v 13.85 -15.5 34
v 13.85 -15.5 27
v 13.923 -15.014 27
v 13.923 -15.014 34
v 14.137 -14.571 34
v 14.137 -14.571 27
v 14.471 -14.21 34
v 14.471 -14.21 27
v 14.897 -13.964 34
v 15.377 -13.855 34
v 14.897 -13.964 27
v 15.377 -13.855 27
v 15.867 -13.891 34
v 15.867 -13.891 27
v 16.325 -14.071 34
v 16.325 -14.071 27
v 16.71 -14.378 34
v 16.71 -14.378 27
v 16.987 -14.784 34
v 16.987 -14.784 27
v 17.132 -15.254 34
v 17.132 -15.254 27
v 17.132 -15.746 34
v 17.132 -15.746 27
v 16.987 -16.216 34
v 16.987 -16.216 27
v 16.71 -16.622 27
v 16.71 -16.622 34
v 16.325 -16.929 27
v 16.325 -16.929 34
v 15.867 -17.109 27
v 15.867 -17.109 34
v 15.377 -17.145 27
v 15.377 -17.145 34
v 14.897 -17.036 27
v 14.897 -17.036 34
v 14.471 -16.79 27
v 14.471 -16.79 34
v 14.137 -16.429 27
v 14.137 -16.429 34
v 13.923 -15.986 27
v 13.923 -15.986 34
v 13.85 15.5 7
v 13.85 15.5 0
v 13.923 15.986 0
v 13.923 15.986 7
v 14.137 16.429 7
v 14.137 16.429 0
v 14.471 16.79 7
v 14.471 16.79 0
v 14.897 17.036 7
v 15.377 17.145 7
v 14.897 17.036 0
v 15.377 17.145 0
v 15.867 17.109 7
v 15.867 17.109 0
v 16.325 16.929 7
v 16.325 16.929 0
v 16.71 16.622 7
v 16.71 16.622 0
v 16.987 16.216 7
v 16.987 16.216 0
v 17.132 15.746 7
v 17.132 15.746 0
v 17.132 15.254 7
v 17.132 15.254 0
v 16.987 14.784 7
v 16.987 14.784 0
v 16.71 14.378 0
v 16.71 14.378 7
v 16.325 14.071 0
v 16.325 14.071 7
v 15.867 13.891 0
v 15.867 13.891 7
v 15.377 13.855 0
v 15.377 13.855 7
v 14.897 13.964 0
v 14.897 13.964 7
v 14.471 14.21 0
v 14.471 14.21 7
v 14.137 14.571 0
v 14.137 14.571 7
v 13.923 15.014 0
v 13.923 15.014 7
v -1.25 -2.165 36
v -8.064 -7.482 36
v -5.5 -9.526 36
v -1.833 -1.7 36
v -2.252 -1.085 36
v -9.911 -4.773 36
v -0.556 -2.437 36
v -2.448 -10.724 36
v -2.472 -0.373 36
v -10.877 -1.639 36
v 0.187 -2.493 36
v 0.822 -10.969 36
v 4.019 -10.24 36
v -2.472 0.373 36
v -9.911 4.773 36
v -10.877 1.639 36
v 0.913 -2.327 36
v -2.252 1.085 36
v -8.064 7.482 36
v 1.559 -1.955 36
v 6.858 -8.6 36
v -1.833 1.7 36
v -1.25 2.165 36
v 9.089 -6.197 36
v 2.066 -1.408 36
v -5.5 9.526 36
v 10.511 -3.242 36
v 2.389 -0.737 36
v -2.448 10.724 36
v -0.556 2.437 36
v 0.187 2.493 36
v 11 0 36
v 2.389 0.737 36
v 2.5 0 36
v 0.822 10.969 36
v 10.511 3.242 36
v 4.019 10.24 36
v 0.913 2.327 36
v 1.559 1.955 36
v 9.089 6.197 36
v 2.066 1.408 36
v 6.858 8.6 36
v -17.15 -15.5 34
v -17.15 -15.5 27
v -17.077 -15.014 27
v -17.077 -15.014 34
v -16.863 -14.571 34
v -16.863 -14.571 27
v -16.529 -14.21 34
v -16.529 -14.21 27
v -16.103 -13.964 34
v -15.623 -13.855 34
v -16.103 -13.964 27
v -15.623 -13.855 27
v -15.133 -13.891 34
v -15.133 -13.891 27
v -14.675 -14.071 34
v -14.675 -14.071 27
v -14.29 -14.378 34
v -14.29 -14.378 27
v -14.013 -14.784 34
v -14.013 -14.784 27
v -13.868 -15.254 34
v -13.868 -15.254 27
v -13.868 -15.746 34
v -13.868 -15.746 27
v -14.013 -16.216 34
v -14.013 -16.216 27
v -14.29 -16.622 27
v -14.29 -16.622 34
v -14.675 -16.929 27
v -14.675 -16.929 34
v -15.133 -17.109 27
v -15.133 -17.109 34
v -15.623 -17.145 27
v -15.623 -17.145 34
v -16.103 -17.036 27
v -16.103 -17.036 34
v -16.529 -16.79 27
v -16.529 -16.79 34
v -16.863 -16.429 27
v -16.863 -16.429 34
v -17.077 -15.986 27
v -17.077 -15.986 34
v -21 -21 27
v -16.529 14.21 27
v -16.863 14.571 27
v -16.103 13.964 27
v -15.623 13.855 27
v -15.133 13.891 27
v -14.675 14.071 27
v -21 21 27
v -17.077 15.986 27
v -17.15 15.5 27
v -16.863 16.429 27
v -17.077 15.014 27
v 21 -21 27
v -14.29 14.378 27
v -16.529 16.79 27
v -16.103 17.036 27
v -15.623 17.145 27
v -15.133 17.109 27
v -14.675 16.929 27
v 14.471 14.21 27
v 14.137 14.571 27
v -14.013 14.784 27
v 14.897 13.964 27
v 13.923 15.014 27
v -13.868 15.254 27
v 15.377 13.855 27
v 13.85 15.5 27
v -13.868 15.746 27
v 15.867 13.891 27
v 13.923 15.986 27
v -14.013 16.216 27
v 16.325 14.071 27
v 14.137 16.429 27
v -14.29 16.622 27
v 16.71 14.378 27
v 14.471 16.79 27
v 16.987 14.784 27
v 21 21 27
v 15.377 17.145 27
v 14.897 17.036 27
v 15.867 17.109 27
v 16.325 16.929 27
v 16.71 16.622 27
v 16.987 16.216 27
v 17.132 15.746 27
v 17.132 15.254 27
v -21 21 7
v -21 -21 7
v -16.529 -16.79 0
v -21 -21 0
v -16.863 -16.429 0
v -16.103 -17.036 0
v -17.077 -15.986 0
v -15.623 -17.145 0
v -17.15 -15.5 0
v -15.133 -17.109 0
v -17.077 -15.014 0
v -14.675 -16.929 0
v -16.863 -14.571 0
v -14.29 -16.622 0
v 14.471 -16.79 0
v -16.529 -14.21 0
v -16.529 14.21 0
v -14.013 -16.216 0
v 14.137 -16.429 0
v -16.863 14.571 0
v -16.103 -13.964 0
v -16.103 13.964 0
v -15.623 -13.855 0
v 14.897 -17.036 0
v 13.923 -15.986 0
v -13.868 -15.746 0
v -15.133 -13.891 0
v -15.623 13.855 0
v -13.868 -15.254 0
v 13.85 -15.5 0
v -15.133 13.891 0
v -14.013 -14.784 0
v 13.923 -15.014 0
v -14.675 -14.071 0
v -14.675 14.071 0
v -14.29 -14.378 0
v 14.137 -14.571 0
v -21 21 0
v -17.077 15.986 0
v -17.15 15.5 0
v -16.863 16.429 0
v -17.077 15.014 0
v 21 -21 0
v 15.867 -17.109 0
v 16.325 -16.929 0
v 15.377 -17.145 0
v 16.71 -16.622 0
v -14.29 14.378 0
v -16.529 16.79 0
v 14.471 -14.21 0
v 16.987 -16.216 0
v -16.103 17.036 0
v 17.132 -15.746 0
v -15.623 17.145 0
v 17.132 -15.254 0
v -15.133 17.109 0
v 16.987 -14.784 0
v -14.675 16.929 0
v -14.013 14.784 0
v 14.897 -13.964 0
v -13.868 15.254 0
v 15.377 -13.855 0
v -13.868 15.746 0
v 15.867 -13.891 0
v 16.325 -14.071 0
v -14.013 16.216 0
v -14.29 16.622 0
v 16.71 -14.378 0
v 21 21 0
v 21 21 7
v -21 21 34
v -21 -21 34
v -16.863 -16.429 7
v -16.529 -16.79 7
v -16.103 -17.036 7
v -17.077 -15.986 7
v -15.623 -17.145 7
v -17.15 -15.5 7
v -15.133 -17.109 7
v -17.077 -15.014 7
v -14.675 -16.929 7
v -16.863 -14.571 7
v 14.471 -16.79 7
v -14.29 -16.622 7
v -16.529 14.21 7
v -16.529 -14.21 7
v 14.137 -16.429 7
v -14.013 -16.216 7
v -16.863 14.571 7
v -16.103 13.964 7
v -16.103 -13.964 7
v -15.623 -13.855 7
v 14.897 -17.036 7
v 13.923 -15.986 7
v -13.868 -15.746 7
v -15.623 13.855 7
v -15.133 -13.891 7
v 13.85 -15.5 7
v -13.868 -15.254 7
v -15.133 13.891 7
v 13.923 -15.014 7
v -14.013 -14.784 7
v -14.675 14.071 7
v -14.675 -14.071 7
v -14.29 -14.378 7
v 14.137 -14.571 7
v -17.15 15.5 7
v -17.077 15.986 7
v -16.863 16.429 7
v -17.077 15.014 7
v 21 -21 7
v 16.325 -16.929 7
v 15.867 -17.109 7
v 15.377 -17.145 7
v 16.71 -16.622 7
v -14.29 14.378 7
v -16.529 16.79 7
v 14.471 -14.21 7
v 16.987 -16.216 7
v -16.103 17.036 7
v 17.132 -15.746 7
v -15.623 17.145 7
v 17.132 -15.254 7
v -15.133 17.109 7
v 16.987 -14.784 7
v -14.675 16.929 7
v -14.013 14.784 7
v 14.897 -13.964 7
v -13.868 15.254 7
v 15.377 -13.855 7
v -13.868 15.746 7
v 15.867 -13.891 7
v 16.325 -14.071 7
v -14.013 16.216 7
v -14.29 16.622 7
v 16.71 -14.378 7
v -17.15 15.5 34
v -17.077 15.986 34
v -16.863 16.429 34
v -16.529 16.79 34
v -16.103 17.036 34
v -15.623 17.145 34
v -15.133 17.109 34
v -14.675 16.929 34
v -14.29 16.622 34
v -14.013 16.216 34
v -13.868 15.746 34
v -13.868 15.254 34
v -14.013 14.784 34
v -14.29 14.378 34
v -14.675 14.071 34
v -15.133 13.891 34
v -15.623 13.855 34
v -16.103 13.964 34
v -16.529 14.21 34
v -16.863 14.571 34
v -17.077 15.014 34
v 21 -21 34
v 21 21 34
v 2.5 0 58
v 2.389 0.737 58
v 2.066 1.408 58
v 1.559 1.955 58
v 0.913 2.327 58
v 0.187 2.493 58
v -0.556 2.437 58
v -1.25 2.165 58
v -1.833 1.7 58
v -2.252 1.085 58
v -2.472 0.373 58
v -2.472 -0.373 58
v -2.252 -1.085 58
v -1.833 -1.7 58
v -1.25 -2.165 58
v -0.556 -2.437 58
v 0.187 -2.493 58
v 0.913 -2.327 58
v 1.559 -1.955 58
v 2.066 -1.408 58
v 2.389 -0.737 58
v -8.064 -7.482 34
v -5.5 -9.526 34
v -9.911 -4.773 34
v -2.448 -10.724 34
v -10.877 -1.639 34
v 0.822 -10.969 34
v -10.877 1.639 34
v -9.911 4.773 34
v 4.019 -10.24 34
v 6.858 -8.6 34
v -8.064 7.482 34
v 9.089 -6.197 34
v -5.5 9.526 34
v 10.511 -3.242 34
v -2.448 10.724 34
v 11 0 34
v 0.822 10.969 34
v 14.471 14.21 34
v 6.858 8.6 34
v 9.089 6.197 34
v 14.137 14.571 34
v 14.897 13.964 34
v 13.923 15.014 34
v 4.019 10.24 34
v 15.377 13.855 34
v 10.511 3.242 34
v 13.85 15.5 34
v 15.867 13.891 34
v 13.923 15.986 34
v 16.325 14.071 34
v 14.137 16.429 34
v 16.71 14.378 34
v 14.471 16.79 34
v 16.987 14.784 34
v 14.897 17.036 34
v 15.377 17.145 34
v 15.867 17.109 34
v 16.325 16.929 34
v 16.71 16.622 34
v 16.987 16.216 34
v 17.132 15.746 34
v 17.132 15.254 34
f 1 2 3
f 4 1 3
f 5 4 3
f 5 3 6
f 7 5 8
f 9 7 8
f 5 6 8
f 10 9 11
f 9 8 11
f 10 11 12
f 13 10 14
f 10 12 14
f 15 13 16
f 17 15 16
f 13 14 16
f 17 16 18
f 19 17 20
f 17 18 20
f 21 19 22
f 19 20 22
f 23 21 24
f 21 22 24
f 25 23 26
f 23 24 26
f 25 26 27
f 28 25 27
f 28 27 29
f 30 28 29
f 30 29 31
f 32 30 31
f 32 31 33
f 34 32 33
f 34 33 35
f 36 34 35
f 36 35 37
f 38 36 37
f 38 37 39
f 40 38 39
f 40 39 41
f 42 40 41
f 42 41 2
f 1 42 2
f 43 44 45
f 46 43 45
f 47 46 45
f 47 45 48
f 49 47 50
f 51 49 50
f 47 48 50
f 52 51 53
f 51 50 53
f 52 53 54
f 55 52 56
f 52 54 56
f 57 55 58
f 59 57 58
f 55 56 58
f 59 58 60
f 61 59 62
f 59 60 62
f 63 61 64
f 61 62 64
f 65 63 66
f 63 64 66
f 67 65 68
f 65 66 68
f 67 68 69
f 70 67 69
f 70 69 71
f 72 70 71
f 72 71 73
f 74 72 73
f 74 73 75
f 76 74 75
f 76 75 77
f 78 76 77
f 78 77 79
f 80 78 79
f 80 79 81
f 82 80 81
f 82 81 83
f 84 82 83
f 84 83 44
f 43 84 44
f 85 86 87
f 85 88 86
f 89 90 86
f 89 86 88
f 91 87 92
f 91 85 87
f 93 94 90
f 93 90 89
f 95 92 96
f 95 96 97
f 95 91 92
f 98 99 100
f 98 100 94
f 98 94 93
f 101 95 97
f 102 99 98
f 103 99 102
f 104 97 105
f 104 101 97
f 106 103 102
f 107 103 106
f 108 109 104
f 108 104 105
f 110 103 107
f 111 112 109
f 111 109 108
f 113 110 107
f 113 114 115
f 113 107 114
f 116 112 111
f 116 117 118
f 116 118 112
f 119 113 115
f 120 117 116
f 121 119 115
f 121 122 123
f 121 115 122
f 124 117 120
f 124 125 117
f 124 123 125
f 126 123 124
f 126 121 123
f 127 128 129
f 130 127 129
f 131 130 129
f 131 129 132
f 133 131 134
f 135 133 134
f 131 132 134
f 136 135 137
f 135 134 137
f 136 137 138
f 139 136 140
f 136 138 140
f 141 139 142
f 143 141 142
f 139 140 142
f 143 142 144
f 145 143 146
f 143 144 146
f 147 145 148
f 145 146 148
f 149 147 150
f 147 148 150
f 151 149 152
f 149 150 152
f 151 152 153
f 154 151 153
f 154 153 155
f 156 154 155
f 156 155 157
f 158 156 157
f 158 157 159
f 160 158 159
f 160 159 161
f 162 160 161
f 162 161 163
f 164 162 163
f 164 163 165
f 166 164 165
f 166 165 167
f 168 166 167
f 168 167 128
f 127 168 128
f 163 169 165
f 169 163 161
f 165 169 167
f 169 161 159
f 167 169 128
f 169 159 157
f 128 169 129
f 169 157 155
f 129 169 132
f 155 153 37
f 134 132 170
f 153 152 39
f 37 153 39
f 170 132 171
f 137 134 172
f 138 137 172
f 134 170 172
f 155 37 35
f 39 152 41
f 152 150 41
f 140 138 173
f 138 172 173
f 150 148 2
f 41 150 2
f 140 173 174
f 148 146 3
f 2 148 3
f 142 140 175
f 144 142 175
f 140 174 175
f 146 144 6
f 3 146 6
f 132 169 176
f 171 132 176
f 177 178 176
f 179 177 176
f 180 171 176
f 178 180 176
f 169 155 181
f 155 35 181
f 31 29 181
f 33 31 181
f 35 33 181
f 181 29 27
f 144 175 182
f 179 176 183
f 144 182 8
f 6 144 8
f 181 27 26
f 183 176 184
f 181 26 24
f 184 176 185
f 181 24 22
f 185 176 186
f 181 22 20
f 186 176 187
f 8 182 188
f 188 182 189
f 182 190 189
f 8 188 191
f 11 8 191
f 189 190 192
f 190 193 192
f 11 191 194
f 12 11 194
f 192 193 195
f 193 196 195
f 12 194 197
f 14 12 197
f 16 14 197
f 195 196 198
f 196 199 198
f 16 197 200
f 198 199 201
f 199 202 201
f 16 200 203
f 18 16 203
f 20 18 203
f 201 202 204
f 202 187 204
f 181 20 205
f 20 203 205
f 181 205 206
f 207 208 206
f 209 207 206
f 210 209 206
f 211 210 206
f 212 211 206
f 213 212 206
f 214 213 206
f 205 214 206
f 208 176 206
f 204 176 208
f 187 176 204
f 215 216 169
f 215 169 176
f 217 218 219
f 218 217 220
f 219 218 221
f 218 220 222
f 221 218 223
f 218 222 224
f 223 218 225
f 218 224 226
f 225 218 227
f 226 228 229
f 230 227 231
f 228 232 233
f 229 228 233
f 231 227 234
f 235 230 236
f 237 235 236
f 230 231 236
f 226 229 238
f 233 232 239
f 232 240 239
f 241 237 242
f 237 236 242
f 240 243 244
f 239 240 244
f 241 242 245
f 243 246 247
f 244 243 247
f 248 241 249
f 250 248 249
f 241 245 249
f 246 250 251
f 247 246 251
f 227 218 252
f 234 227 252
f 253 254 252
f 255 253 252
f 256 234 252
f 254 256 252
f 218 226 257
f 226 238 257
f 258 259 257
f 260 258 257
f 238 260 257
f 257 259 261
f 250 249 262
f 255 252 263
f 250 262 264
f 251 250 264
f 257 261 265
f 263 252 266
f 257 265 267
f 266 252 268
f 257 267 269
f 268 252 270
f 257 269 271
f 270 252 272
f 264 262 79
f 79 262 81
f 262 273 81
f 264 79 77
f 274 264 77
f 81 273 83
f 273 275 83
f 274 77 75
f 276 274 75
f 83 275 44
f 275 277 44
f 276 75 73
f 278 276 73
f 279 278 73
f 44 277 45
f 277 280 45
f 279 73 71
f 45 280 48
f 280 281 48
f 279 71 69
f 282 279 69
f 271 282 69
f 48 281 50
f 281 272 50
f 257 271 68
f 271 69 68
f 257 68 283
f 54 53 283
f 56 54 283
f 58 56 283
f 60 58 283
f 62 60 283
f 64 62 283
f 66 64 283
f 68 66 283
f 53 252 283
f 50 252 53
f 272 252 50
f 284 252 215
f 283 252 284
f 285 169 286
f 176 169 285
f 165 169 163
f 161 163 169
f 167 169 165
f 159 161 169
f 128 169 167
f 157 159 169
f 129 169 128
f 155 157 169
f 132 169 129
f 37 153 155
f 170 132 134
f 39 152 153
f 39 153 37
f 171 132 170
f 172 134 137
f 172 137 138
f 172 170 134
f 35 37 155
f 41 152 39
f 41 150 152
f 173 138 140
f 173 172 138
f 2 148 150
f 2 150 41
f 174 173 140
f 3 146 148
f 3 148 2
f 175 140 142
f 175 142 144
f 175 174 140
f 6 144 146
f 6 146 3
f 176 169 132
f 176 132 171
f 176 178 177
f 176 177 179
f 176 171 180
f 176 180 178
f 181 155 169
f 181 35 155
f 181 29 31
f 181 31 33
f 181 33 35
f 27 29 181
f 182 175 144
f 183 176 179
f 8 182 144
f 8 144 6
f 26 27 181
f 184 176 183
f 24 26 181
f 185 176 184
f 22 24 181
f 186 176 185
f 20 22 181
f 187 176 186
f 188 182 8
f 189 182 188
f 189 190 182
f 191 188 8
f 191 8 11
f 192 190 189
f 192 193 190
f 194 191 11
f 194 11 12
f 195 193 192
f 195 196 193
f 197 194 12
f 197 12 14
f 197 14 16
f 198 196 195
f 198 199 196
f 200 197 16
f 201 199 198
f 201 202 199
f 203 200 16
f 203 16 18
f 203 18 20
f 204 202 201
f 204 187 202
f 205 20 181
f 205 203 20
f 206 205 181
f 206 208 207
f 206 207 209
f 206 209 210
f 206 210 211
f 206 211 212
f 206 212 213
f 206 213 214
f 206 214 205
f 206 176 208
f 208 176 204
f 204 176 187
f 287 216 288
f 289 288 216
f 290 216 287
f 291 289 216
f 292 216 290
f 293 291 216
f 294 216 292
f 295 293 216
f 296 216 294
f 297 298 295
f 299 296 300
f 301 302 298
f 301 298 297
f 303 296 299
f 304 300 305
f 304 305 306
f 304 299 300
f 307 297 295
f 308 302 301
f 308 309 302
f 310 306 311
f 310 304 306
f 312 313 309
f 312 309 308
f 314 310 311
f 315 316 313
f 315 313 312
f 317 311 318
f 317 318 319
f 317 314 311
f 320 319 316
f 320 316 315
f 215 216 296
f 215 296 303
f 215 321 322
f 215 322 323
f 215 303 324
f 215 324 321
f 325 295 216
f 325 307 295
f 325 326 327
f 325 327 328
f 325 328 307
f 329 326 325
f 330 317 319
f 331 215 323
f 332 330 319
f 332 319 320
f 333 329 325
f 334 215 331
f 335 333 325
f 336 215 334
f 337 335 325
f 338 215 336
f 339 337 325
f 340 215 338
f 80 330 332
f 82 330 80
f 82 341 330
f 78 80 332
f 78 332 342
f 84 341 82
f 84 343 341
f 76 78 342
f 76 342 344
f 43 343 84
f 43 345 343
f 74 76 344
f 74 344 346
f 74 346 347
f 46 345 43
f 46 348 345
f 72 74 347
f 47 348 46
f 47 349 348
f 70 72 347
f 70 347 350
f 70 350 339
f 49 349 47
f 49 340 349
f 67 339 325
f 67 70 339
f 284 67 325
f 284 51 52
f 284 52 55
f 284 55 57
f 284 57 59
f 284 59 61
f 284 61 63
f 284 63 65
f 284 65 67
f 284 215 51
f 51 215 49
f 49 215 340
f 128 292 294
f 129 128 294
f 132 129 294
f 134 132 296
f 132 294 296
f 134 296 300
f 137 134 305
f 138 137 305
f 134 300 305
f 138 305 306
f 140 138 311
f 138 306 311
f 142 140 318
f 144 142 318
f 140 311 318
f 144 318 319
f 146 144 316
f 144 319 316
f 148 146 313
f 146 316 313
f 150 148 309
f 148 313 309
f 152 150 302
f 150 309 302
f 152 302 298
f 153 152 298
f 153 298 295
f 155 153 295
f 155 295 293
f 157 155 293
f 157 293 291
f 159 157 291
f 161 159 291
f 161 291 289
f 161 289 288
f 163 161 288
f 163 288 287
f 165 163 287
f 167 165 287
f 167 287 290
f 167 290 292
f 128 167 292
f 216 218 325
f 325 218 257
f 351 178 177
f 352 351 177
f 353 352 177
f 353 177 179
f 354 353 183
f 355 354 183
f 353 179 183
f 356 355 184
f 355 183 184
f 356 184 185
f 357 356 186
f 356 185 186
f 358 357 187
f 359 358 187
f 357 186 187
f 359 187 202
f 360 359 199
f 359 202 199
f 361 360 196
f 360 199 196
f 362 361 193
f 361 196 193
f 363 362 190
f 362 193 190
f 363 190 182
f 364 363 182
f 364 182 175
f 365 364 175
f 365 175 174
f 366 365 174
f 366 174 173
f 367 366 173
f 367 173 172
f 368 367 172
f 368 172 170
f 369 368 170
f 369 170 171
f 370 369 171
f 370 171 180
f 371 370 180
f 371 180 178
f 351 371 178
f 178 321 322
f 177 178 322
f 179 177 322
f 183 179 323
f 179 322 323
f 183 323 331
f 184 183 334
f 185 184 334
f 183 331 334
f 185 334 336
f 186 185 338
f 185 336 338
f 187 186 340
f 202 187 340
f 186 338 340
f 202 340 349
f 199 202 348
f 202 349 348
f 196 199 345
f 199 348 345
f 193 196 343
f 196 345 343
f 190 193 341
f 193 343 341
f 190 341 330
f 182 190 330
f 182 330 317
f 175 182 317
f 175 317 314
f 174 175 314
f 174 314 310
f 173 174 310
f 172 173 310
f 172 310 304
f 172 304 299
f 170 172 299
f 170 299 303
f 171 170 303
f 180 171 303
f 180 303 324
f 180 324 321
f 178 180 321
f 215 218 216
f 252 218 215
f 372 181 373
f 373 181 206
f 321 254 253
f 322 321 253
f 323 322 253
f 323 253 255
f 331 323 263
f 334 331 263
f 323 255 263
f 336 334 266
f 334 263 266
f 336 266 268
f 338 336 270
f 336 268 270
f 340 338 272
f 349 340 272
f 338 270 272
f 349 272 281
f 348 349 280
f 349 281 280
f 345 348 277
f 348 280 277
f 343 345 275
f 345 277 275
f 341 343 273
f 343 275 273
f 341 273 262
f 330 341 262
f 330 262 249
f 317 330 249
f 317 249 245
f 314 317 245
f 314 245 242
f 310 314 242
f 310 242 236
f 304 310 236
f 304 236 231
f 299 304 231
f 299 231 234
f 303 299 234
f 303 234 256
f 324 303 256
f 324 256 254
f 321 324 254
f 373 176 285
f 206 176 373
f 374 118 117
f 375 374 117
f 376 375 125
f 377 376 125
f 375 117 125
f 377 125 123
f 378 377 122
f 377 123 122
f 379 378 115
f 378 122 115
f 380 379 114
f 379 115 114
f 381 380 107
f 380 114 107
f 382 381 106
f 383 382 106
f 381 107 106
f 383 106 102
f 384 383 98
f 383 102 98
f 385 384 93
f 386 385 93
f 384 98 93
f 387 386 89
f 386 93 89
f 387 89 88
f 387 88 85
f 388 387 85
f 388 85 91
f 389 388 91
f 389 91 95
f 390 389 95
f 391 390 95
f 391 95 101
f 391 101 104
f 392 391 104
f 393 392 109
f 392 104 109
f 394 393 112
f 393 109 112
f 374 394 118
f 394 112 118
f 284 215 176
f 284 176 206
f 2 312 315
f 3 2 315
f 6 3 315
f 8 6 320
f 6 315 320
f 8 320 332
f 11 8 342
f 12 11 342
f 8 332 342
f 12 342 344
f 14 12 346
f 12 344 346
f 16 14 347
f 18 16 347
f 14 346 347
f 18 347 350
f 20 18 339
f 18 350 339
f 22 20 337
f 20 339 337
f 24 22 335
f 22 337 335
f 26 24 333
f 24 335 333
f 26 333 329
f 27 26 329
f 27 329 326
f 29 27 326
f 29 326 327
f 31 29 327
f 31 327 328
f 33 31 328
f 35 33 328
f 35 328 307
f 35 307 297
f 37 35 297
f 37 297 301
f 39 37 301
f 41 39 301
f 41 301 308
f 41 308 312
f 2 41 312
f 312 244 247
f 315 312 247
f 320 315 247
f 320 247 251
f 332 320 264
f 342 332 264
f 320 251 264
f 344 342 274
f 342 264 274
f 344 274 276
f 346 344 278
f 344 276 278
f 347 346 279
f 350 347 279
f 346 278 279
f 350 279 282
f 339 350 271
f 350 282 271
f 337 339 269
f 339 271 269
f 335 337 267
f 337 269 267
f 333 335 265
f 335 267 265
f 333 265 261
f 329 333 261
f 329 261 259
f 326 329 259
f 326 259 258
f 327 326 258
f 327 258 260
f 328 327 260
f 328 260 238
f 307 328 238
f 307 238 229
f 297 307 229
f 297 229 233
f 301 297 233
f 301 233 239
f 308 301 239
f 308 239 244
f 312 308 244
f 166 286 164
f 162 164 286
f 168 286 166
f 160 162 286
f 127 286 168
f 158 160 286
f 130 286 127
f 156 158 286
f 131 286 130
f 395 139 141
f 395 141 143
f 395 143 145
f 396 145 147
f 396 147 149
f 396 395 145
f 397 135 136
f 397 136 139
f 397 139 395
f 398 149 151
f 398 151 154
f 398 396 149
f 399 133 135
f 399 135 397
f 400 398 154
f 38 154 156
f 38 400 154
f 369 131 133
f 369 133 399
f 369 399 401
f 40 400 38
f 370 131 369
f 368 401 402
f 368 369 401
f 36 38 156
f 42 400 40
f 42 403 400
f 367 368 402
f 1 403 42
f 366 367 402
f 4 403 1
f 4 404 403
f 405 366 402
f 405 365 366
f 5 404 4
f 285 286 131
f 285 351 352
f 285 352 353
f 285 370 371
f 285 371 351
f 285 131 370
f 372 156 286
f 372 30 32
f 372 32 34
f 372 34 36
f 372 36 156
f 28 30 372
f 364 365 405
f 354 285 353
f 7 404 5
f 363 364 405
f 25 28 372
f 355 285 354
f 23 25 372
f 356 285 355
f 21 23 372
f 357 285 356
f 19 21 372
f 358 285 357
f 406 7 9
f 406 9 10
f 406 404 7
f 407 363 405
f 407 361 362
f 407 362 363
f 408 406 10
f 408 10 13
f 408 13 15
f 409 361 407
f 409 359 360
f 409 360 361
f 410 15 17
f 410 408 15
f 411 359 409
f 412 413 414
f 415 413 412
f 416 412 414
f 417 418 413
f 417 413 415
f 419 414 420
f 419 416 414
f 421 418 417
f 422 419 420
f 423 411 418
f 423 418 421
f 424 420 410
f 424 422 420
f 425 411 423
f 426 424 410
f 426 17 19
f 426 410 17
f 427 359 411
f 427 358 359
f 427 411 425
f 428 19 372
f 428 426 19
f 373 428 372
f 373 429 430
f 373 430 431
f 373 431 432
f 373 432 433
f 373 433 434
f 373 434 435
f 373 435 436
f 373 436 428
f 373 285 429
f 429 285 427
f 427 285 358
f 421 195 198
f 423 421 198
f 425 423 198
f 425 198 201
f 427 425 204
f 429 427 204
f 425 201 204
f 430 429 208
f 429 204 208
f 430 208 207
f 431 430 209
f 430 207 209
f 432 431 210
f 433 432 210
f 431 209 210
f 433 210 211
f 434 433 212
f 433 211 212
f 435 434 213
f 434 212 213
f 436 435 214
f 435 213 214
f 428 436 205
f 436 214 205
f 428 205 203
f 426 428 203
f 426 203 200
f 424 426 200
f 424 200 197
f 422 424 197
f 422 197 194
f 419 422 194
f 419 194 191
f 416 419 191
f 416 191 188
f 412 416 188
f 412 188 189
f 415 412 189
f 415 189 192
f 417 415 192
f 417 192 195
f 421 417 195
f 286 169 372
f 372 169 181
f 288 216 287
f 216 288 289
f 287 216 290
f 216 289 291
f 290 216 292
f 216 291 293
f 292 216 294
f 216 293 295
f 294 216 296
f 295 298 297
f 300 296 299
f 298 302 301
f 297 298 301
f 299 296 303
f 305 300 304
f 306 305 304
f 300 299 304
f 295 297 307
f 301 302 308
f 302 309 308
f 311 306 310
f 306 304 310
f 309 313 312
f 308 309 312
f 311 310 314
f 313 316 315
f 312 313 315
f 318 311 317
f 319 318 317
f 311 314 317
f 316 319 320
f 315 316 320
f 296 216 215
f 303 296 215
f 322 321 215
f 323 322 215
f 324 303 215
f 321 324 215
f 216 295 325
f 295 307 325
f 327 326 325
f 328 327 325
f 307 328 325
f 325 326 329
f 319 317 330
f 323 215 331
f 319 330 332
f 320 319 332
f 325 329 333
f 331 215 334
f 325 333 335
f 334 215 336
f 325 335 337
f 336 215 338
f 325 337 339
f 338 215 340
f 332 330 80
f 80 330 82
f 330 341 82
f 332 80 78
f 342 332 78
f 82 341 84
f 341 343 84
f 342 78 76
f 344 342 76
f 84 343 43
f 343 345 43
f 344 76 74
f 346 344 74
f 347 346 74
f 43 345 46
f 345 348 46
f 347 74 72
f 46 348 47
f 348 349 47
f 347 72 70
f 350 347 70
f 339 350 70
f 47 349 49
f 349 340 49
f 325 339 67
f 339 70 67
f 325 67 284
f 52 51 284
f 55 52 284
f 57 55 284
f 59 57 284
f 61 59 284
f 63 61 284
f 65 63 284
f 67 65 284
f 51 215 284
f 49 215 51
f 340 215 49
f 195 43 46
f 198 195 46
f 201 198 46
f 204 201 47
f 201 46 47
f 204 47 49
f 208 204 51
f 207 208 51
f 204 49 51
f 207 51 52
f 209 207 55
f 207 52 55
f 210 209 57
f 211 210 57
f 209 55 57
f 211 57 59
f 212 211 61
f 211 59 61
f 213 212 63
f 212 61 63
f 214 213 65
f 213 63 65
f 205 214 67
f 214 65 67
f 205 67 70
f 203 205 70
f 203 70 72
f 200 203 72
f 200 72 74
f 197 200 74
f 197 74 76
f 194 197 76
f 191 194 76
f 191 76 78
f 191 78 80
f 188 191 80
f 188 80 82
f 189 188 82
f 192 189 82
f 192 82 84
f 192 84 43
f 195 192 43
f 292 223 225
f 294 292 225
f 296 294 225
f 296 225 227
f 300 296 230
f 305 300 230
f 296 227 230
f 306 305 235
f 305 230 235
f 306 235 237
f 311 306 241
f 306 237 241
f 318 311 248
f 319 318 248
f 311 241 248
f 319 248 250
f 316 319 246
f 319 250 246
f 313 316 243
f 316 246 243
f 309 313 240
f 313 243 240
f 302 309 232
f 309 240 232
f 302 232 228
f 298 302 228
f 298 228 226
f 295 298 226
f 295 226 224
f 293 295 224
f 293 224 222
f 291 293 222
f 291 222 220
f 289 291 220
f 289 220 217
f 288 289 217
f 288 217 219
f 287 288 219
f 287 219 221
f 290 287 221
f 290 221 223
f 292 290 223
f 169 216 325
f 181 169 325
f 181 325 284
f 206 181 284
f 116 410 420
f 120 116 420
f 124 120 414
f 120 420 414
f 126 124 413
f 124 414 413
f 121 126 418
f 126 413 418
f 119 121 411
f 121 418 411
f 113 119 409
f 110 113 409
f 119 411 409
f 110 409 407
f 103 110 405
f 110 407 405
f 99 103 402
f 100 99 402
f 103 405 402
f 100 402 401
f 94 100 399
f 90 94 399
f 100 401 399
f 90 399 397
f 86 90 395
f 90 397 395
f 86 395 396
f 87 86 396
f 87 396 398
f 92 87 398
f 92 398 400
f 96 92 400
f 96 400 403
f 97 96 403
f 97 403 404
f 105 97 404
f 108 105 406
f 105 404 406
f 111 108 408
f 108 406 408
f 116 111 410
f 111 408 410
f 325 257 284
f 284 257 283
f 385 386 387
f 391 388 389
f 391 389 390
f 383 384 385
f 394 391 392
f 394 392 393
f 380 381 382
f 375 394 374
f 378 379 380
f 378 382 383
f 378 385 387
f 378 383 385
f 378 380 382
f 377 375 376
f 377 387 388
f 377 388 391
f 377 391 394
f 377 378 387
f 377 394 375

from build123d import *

# Parameters (mm, degrees)
F0_W     = 42
F0_H     = 42
F1_DEPTH = 7
F2_DEPTH = 20
F3_DEPTH = 7
F5_D     = 3.3
F5_2_D   = 3.3
F5_3_D   = 3.3
F6_R     = 11
F7_DEPTH = 2
F8_R     = 2.5
F9_DEPTH = 22


with BuildPart() as f1:
    # F0 (on Top) → F1 (new body)
    with BuildSketch(Plane.XY):
        Rectangle(F0_W, F0_H)
    extrude(amount=F1_DEPTH)


with BuildPart() as f2:
    # F2 (new): a face of the model
    f2_faces = [f1.part.faces().sort_by_distance(p)[0] for p in [
        (0, 0, 7),
    ]]
    extrude(f2_faces, amount=F2_DEPTH)


with BuildPart() as f3:
    # F3 (new): a face of the model
    f3_faces = [f2.part.faces().sort_by_distance(p)[0] for p in [
        (0, 0, 27),
    ]]
    extrude(f3_faces, amount=F3_DEPTH)

    # F5#3 (through all)
    with Locations(Plane.XY.offset(34)):
        with Locations((-15.5, 15.5), (15.5, 15.5), (-15.5, -15.5), (15.5, -15.5)):
            Hole(F5_3_D / 2)

    # F6 (on face) → F7 (join)
    with BuildSketch(Plane.XY.offset(34)):
        Circle(F6_R)
    extrude(amount=F7_DEPTH)

    # F8 (on face) → F9 (join)
    with BuildSketch(Plane.XY.offset(36)):
        Circle(F8_R)
    extrude(amount=F9_DEPTH)


with BuildPart() as f1_1:
    add(f1.part)

    # F5 (through all)
    with Locations(Plane.XY.offset(34)):
        with Locations((-15.5, 15.5), (15.5, 15.5), (-15.5, -15.5), (15.5, -15.5)):
            Hole(F5_D / 2)


with BuildPart() as f2_1:
    add(f2.part)

    # F5#2 (through all)
    with Locations(Plane.XY.offset(34)):
        with Locations((-15.5, 15.5), (15.5, 15.5), (-15.5, -15.5), (15.5, -15.5)):
            Hole(F5_2_D / 2)


solid = Compound([f3.part, f1_1.part, f2_1.part])
